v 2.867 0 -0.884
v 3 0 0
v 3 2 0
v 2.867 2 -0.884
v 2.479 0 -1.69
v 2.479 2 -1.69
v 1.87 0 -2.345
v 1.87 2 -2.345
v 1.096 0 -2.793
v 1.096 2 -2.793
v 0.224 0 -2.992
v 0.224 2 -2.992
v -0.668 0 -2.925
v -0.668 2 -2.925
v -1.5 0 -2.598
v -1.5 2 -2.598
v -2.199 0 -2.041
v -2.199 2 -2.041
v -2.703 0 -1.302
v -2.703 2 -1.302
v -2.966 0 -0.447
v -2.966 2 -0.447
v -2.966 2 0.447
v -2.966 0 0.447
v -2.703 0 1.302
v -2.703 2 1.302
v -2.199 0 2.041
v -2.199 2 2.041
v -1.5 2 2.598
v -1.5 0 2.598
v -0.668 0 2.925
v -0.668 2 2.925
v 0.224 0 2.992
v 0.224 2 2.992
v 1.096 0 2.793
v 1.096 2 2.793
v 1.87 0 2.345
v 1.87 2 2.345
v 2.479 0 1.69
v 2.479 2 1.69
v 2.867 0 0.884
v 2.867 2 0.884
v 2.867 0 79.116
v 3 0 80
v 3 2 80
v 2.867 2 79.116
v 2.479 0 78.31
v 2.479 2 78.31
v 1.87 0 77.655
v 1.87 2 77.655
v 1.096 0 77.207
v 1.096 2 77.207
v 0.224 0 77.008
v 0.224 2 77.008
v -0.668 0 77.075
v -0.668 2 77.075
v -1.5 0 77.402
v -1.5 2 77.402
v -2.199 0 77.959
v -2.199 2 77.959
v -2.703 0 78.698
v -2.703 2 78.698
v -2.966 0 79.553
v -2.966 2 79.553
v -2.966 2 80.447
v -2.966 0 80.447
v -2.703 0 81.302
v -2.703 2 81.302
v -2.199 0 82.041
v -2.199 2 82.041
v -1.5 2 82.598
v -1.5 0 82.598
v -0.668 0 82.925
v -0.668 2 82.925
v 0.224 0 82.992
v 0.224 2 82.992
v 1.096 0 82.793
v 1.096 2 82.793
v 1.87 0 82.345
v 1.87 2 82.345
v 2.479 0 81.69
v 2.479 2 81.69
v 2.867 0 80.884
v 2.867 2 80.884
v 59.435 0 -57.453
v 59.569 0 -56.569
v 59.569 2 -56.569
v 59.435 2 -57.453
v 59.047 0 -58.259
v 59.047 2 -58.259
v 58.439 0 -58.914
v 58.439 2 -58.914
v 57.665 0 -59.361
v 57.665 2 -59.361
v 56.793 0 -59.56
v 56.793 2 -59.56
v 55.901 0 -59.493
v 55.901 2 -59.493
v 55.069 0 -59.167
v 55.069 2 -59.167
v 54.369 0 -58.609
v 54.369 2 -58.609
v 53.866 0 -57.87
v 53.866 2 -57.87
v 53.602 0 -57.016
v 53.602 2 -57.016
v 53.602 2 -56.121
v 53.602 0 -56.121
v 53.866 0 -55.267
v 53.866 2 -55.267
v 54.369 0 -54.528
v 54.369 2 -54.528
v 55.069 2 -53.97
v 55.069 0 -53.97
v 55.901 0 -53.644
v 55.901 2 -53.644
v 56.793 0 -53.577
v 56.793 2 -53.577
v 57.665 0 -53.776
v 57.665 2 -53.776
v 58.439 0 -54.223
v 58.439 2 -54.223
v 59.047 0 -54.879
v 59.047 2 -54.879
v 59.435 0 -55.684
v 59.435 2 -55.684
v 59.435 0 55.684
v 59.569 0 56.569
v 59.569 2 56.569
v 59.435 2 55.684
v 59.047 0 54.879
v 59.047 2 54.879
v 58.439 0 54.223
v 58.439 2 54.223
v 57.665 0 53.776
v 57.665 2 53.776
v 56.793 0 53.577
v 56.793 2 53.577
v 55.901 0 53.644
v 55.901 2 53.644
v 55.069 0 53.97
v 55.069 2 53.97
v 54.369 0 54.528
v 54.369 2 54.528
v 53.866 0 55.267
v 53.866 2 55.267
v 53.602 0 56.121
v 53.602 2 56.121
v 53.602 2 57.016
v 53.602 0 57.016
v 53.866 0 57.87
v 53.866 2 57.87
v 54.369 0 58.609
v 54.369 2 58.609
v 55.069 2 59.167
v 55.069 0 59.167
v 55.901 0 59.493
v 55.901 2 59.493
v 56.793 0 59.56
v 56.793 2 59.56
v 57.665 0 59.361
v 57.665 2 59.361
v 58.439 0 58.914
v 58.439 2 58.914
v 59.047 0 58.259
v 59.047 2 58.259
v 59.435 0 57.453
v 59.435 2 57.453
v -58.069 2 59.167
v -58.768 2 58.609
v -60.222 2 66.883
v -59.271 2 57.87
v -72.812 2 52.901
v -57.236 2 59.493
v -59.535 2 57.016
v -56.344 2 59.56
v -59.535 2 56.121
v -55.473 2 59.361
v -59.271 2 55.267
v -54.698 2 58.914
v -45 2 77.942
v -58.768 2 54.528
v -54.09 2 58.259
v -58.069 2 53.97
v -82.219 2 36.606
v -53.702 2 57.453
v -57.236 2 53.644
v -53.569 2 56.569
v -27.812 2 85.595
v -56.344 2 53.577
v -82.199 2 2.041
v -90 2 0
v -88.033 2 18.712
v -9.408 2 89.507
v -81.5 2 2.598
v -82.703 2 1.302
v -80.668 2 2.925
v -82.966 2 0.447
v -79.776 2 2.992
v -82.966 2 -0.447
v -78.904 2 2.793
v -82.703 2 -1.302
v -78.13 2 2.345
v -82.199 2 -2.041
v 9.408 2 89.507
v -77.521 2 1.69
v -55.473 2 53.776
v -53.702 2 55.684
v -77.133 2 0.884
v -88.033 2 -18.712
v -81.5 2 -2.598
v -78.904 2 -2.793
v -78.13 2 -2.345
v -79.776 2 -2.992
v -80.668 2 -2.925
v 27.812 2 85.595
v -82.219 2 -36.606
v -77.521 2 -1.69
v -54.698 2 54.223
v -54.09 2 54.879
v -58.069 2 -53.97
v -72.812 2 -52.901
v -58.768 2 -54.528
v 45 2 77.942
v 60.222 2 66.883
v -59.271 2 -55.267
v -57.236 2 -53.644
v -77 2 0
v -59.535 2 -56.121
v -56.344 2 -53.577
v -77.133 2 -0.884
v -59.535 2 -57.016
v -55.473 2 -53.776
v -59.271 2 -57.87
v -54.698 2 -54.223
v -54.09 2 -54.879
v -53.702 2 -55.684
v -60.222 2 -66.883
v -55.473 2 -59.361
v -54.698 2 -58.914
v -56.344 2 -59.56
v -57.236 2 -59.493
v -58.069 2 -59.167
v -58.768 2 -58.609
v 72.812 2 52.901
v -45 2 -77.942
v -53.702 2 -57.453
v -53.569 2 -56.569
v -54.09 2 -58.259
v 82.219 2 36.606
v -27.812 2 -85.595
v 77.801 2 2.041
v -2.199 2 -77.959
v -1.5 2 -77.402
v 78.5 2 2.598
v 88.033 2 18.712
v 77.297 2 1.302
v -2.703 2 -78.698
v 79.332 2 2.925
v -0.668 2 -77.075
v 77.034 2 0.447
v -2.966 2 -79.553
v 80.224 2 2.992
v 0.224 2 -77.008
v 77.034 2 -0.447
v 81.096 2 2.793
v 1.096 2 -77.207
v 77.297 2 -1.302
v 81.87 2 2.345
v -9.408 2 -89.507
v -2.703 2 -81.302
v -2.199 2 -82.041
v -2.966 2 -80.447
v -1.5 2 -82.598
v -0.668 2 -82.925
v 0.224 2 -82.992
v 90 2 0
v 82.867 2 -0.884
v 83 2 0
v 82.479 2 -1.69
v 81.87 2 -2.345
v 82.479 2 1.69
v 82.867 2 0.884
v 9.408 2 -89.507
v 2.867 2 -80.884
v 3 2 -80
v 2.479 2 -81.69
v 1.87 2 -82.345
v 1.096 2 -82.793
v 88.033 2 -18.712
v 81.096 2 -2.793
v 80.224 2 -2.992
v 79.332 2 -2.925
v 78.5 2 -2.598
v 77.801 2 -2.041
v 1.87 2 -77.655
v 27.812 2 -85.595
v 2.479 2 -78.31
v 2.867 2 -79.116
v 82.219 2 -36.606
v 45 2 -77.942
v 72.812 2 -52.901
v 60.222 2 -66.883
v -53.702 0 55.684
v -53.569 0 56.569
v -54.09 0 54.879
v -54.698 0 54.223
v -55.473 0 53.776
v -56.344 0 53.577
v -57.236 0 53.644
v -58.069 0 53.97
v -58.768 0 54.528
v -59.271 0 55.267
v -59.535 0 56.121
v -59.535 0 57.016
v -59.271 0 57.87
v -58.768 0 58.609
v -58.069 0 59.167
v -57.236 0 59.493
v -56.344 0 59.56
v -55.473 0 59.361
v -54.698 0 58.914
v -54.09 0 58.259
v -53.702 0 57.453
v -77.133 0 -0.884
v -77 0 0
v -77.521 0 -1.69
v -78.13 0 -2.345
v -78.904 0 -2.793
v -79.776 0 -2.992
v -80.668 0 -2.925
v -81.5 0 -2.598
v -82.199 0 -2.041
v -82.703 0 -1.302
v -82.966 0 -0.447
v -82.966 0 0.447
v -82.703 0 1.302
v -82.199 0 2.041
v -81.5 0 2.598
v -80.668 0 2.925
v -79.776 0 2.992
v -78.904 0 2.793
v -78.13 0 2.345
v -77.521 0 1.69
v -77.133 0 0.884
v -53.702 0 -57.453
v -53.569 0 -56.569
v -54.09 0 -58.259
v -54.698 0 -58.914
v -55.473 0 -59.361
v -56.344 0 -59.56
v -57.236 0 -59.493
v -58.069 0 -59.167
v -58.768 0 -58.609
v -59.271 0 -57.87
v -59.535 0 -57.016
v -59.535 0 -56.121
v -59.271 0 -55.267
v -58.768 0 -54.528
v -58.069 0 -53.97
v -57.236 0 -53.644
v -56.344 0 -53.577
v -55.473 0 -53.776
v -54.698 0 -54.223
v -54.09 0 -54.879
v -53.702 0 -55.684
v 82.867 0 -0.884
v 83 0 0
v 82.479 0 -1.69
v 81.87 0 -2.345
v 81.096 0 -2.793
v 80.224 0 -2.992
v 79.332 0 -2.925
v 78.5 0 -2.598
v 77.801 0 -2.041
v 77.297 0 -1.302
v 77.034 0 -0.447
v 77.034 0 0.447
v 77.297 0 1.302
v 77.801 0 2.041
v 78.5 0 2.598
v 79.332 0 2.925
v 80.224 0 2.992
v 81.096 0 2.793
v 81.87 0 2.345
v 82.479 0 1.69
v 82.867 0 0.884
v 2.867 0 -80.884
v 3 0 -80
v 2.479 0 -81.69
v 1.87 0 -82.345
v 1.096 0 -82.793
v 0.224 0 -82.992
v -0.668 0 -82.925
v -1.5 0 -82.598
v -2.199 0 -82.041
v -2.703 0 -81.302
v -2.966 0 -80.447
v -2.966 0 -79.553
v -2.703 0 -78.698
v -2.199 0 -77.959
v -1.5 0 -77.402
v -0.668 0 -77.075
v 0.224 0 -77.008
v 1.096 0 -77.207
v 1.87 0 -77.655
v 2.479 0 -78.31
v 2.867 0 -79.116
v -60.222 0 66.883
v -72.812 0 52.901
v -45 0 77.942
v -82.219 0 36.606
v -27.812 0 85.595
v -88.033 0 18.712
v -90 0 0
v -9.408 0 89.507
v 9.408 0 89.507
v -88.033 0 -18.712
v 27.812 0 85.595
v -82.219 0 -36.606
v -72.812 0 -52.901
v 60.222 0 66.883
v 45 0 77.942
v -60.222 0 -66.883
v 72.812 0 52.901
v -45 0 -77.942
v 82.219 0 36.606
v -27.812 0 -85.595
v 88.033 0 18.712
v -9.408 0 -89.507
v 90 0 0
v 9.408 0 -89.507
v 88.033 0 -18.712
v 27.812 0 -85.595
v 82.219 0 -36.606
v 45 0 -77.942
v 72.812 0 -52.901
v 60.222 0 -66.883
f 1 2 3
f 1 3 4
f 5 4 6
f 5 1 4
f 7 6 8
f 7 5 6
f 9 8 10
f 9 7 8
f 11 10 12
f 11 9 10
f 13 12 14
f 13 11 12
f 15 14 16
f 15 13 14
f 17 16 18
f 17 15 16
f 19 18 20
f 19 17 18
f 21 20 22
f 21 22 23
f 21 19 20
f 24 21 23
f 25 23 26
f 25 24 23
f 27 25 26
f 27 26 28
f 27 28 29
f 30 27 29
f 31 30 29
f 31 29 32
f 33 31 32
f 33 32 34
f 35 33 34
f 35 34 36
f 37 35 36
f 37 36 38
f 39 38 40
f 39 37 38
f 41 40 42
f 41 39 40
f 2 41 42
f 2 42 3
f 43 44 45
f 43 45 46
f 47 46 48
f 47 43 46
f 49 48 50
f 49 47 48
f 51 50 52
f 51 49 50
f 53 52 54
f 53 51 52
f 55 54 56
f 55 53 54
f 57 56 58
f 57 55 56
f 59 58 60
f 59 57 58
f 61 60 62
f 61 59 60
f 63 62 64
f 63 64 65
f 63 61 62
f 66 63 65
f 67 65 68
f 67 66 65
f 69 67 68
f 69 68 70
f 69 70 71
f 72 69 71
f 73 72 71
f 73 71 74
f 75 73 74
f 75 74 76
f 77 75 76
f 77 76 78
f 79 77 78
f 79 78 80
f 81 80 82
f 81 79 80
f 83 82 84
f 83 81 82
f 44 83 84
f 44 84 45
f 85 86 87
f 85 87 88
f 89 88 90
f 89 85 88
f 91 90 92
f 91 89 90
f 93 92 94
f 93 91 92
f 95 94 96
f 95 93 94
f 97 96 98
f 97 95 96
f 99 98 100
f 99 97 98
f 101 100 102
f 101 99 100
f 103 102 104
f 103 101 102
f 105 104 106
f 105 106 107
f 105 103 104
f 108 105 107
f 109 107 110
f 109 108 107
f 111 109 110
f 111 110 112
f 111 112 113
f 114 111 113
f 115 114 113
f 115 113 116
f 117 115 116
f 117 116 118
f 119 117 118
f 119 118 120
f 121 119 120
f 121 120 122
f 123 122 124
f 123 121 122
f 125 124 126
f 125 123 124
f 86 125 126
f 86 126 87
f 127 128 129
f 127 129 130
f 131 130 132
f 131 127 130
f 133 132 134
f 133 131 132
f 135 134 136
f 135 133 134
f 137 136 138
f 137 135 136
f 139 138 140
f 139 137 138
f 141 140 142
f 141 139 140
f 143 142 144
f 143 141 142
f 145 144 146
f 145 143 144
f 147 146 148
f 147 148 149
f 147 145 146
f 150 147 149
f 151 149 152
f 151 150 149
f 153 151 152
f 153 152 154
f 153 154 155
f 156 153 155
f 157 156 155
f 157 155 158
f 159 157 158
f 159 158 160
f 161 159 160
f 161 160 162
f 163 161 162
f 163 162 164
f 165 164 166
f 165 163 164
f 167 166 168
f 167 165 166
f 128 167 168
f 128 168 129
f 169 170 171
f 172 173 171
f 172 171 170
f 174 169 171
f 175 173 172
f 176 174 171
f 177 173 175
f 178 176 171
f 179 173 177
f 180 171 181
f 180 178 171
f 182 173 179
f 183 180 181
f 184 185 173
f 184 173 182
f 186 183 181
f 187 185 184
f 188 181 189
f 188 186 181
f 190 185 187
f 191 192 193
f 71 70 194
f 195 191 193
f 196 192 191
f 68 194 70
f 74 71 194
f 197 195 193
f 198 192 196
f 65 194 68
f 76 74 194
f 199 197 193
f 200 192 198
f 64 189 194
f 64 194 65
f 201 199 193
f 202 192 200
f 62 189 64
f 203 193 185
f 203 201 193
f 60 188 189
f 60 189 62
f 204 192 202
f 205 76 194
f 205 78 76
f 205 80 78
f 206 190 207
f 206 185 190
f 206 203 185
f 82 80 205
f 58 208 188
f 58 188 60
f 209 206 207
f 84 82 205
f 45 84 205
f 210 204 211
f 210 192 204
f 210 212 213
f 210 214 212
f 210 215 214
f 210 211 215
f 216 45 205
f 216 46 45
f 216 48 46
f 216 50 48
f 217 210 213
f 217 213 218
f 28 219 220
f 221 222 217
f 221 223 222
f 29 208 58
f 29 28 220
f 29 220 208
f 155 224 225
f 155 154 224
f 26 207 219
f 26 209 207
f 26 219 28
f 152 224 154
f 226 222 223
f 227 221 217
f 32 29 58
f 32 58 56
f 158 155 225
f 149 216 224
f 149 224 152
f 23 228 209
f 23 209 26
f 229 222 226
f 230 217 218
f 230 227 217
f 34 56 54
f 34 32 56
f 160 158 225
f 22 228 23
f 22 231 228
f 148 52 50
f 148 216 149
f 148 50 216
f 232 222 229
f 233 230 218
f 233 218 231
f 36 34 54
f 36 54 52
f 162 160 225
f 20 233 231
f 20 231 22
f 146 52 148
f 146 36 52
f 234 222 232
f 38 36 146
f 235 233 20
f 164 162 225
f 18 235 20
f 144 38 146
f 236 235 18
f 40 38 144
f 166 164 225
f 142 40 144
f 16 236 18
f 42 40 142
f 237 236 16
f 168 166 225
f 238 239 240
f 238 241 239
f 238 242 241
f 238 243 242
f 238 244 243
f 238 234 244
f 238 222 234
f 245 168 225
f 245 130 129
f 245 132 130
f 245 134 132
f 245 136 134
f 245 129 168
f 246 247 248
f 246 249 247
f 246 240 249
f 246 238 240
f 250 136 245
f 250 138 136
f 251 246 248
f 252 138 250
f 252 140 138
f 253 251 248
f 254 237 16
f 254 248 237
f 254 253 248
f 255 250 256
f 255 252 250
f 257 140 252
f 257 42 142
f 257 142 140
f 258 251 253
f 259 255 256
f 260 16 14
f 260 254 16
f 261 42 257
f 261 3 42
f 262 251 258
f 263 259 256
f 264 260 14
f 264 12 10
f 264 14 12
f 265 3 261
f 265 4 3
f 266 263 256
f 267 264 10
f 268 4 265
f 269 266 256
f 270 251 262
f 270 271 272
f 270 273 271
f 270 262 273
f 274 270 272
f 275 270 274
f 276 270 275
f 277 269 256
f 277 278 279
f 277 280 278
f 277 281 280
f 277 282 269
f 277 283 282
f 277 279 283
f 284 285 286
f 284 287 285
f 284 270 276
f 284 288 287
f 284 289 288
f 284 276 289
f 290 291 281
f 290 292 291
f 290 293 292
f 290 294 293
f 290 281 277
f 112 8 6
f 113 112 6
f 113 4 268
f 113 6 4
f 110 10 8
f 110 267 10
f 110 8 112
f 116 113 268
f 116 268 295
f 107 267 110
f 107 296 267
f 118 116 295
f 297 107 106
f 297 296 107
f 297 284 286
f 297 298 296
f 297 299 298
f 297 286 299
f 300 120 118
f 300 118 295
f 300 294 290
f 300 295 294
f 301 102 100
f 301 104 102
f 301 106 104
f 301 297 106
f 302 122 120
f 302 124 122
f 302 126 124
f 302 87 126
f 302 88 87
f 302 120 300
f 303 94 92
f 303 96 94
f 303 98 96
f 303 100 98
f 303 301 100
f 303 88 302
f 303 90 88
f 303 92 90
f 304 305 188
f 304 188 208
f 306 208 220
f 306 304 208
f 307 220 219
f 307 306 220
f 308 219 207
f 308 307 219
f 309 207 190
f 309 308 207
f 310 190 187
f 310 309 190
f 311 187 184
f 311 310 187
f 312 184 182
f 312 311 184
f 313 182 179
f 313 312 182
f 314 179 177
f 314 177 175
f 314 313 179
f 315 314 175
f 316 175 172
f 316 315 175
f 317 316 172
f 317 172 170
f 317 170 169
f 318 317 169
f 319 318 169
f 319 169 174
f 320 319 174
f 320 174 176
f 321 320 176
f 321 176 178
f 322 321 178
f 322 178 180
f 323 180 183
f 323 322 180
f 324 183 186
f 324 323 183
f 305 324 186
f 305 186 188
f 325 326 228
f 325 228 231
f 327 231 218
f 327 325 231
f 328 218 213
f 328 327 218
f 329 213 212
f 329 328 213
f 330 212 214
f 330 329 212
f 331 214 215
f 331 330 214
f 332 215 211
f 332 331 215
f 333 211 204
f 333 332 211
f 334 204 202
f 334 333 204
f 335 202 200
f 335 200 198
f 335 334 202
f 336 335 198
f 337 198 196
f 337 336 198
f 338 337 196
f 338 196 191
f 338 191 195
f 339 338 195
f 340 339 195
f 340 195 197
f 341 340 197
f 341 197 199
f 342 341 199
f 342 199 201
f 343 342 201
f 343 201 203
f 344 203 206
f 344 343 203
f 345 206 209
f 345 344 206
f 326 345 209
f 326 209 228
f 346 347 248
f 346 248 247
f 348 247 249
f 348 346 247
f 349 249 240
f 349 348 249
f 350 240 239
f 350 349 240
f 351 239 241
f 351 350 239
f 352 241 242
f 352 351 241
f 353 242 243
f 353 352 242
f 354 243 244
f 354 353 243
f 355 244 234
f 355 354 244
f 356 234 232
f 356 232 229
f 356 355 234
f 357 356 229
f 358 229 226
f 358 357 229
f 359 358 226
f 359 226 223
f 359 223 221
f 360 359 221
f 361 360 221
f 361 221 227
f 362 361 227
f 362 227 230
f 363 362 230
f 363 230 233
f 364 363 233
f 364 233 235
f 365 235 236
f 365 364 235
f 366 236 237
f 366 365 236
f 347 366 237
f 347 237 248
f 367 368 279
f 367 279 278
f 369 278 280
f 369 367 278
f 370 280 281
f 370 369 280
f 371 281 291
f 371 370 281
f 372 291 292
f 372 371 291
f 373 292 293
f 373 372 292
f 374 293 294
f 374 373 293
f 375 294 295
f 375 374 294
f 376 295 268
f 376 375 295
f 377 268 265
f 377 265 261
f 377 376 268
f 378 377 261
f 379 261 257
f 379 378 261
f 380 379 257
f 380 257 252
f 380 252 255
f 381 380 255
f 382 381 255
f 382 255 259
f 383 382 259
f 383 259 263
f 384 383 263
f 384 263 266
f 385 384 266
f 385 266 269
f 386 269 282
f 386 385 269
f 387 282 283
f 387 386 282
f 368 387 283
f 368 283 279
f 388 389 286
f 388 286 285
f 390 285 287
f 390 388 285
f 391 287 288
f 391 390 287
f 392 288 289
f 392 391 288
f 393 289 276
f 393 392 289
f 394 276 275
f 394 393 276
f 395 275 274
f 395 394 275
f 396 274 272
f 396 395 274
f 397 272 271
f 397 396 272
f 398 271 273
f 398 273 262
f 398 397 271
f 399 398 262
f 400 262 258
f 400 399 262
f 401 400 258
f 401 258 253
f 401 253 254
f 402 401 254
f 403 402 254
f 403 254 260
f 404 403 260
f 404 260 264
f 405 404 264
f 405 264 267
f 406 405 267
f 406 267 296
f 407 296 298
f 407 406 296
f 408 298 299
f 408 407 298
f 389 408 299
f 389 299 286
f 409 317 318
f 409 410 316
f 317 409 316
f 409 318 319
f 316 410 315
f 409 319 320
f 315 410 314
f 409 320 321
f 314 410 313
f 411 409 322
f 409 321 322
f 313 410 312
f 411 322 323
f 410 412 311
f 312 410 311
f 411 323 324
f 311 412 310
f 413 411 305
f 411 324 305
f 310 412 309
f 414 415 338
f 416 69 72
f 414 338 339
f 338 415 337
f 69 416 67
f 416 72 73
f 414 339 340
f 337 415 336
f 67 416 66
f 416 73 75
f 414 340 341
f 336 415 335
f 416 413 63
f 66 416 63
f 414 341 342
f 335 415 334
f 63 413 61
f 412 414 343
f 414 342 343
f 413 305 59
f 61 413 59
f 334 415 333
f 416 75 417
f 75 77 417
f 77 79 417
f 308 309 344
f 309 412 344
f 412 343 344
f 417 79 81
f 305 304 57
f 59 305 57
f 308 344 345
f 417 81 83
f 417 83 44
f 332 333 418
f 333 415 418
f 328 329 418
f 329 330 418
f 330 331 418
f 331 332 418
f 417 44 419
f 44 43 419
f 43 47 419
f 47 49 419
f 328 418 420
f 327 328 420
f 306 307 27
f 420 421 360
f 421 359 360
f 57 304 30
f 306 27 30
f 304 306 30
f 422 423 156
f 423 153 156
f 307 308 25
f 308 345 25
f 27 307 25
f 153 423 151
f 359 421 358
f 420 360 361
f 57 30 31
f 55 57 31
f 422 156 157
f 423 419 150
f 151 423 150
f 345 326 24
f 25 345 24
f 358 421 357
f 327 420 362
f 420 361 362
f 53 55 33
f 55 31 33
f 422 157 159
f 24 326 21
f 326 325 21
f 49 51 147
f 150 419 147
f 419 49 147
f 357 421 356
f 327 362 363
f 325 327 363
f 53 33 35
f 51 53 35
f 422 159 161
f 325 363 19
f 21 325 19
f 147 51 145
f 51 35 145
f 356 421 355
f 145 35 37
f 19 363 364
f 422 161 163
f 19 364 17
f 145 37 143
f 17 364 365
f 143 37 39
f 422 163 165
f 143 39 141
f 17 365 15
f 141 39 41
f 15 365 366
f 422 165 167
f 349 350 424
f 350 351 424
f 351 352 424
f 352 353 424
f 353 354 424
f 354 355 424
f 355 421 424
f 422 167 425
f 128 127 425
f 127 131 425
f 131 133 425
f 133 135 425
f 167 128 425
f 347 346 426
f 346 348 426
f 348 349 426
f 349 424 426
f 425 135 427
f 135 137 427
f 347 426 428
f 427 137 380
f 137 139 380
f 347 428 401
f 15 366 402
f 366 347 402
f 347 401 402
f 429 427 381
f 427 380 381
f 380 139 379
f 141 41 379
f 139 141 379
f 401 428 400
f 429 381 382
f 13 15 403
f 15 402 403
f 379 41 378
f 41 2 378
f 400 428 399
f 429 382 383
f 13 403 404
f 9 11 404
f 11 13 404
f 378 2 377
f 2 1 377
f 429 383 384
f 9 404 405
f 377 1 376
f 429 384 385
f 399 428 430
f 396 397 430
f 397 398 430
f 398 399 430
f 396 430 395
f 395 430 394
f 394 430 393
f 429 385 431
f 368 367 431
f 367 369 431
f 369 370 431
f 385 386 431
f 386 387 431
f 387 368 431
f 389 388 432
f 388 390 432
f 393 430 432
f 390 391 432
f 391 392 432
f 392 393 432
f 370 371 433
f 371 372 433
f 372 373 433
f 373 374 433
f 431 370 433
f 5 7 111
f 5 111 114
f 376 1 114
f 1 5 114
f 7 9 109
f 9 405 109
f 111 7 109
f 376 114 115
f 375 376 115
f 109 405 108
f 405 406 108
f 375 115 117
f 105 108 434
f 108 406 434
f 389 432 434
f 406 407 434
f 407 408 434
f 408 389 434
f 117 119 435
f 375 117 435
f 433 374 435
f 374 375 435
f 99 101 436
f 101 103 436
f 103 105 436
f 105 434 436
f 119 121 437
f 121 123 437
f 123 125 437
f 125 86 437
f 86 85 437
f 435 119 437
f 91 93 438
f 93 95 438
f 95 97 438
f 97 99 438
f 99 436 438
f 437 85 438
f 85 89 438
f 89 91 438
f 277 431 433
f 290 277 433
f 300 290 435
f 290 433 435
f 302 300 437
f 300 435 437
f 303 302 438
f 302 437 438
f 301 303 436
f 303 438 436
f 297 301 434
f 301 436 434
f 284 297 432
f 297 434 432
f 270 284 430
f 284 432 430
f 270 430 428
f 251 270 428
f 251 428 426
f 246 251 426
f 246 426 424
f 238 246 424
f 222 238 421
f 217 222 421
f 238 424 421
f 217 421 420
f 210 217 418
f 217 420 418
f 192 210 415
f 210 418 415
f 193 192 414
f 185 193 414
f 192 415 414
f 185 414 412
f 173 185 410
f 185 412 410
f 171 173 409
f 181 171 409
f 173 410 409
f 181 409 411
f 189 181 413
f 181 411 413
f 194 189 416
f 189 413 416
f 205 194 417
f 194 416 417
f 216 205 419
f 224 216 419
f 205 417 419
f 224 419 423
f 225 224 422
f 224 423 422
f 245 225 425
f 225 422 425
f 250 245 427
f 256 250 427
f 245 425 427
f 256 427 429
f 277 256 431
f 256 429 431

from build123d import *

# Parameters (mm, degrees)
SKETCH1_R           = 90
SKETCH1_R_2         = 3
BOSS_EXTRUDE1_DEPTH = 2


with BuildPart() as part:
    # Sketch1 → Boss-Extrude1 (new body)
    with BuildSketch(Plane(origin=(0, 0, 0), x_dir=(1, 0, 0), z_dir=(0, 1, 0))):
        Circle(SKETCH1_R)
        Circle(SKETCH1_R_2, mode=Mode.SUBTRACT)
        with Locations((0, 80)):
            Circle(SKETCH1_R_2, mode=Mode.SUBTRACT)
        with Locations((56.568542495, 56.568542495)):
            Circle(SKETCH1_R_2, mode=Mode.SUBTRACT)
        with Locations((80, 0)):
            Circle(SKETCH1_R_2, mode=Mode.SUBTRACT)
        with Locations((56.568542495, -56.568542495)):
            Circle(SKETCH1_R_2, mode=Mode.SUBTRACT)
        with Locations((0, -80)):
            Circle(SKETCH1_R_2, mode=Mode.SUBTRACT)
        with Locations((-56.568542495, -56.568542495)):
            Circle(SKETCH1_R_2, mode=Mode.SUBTRACT)
        with Locations((-80, 0)):
            Circle(SKETCH1_R_2, mode=Mode.SUBTRACT)
        with Locations((-56.568542495, 56.568542495)):
            Circle(SKETCH1_R_2, mode=Mode.SUBTRACT)
    extrude(amount=BOSS_EXTRUDE1_DEPTH)


solid = part.part
